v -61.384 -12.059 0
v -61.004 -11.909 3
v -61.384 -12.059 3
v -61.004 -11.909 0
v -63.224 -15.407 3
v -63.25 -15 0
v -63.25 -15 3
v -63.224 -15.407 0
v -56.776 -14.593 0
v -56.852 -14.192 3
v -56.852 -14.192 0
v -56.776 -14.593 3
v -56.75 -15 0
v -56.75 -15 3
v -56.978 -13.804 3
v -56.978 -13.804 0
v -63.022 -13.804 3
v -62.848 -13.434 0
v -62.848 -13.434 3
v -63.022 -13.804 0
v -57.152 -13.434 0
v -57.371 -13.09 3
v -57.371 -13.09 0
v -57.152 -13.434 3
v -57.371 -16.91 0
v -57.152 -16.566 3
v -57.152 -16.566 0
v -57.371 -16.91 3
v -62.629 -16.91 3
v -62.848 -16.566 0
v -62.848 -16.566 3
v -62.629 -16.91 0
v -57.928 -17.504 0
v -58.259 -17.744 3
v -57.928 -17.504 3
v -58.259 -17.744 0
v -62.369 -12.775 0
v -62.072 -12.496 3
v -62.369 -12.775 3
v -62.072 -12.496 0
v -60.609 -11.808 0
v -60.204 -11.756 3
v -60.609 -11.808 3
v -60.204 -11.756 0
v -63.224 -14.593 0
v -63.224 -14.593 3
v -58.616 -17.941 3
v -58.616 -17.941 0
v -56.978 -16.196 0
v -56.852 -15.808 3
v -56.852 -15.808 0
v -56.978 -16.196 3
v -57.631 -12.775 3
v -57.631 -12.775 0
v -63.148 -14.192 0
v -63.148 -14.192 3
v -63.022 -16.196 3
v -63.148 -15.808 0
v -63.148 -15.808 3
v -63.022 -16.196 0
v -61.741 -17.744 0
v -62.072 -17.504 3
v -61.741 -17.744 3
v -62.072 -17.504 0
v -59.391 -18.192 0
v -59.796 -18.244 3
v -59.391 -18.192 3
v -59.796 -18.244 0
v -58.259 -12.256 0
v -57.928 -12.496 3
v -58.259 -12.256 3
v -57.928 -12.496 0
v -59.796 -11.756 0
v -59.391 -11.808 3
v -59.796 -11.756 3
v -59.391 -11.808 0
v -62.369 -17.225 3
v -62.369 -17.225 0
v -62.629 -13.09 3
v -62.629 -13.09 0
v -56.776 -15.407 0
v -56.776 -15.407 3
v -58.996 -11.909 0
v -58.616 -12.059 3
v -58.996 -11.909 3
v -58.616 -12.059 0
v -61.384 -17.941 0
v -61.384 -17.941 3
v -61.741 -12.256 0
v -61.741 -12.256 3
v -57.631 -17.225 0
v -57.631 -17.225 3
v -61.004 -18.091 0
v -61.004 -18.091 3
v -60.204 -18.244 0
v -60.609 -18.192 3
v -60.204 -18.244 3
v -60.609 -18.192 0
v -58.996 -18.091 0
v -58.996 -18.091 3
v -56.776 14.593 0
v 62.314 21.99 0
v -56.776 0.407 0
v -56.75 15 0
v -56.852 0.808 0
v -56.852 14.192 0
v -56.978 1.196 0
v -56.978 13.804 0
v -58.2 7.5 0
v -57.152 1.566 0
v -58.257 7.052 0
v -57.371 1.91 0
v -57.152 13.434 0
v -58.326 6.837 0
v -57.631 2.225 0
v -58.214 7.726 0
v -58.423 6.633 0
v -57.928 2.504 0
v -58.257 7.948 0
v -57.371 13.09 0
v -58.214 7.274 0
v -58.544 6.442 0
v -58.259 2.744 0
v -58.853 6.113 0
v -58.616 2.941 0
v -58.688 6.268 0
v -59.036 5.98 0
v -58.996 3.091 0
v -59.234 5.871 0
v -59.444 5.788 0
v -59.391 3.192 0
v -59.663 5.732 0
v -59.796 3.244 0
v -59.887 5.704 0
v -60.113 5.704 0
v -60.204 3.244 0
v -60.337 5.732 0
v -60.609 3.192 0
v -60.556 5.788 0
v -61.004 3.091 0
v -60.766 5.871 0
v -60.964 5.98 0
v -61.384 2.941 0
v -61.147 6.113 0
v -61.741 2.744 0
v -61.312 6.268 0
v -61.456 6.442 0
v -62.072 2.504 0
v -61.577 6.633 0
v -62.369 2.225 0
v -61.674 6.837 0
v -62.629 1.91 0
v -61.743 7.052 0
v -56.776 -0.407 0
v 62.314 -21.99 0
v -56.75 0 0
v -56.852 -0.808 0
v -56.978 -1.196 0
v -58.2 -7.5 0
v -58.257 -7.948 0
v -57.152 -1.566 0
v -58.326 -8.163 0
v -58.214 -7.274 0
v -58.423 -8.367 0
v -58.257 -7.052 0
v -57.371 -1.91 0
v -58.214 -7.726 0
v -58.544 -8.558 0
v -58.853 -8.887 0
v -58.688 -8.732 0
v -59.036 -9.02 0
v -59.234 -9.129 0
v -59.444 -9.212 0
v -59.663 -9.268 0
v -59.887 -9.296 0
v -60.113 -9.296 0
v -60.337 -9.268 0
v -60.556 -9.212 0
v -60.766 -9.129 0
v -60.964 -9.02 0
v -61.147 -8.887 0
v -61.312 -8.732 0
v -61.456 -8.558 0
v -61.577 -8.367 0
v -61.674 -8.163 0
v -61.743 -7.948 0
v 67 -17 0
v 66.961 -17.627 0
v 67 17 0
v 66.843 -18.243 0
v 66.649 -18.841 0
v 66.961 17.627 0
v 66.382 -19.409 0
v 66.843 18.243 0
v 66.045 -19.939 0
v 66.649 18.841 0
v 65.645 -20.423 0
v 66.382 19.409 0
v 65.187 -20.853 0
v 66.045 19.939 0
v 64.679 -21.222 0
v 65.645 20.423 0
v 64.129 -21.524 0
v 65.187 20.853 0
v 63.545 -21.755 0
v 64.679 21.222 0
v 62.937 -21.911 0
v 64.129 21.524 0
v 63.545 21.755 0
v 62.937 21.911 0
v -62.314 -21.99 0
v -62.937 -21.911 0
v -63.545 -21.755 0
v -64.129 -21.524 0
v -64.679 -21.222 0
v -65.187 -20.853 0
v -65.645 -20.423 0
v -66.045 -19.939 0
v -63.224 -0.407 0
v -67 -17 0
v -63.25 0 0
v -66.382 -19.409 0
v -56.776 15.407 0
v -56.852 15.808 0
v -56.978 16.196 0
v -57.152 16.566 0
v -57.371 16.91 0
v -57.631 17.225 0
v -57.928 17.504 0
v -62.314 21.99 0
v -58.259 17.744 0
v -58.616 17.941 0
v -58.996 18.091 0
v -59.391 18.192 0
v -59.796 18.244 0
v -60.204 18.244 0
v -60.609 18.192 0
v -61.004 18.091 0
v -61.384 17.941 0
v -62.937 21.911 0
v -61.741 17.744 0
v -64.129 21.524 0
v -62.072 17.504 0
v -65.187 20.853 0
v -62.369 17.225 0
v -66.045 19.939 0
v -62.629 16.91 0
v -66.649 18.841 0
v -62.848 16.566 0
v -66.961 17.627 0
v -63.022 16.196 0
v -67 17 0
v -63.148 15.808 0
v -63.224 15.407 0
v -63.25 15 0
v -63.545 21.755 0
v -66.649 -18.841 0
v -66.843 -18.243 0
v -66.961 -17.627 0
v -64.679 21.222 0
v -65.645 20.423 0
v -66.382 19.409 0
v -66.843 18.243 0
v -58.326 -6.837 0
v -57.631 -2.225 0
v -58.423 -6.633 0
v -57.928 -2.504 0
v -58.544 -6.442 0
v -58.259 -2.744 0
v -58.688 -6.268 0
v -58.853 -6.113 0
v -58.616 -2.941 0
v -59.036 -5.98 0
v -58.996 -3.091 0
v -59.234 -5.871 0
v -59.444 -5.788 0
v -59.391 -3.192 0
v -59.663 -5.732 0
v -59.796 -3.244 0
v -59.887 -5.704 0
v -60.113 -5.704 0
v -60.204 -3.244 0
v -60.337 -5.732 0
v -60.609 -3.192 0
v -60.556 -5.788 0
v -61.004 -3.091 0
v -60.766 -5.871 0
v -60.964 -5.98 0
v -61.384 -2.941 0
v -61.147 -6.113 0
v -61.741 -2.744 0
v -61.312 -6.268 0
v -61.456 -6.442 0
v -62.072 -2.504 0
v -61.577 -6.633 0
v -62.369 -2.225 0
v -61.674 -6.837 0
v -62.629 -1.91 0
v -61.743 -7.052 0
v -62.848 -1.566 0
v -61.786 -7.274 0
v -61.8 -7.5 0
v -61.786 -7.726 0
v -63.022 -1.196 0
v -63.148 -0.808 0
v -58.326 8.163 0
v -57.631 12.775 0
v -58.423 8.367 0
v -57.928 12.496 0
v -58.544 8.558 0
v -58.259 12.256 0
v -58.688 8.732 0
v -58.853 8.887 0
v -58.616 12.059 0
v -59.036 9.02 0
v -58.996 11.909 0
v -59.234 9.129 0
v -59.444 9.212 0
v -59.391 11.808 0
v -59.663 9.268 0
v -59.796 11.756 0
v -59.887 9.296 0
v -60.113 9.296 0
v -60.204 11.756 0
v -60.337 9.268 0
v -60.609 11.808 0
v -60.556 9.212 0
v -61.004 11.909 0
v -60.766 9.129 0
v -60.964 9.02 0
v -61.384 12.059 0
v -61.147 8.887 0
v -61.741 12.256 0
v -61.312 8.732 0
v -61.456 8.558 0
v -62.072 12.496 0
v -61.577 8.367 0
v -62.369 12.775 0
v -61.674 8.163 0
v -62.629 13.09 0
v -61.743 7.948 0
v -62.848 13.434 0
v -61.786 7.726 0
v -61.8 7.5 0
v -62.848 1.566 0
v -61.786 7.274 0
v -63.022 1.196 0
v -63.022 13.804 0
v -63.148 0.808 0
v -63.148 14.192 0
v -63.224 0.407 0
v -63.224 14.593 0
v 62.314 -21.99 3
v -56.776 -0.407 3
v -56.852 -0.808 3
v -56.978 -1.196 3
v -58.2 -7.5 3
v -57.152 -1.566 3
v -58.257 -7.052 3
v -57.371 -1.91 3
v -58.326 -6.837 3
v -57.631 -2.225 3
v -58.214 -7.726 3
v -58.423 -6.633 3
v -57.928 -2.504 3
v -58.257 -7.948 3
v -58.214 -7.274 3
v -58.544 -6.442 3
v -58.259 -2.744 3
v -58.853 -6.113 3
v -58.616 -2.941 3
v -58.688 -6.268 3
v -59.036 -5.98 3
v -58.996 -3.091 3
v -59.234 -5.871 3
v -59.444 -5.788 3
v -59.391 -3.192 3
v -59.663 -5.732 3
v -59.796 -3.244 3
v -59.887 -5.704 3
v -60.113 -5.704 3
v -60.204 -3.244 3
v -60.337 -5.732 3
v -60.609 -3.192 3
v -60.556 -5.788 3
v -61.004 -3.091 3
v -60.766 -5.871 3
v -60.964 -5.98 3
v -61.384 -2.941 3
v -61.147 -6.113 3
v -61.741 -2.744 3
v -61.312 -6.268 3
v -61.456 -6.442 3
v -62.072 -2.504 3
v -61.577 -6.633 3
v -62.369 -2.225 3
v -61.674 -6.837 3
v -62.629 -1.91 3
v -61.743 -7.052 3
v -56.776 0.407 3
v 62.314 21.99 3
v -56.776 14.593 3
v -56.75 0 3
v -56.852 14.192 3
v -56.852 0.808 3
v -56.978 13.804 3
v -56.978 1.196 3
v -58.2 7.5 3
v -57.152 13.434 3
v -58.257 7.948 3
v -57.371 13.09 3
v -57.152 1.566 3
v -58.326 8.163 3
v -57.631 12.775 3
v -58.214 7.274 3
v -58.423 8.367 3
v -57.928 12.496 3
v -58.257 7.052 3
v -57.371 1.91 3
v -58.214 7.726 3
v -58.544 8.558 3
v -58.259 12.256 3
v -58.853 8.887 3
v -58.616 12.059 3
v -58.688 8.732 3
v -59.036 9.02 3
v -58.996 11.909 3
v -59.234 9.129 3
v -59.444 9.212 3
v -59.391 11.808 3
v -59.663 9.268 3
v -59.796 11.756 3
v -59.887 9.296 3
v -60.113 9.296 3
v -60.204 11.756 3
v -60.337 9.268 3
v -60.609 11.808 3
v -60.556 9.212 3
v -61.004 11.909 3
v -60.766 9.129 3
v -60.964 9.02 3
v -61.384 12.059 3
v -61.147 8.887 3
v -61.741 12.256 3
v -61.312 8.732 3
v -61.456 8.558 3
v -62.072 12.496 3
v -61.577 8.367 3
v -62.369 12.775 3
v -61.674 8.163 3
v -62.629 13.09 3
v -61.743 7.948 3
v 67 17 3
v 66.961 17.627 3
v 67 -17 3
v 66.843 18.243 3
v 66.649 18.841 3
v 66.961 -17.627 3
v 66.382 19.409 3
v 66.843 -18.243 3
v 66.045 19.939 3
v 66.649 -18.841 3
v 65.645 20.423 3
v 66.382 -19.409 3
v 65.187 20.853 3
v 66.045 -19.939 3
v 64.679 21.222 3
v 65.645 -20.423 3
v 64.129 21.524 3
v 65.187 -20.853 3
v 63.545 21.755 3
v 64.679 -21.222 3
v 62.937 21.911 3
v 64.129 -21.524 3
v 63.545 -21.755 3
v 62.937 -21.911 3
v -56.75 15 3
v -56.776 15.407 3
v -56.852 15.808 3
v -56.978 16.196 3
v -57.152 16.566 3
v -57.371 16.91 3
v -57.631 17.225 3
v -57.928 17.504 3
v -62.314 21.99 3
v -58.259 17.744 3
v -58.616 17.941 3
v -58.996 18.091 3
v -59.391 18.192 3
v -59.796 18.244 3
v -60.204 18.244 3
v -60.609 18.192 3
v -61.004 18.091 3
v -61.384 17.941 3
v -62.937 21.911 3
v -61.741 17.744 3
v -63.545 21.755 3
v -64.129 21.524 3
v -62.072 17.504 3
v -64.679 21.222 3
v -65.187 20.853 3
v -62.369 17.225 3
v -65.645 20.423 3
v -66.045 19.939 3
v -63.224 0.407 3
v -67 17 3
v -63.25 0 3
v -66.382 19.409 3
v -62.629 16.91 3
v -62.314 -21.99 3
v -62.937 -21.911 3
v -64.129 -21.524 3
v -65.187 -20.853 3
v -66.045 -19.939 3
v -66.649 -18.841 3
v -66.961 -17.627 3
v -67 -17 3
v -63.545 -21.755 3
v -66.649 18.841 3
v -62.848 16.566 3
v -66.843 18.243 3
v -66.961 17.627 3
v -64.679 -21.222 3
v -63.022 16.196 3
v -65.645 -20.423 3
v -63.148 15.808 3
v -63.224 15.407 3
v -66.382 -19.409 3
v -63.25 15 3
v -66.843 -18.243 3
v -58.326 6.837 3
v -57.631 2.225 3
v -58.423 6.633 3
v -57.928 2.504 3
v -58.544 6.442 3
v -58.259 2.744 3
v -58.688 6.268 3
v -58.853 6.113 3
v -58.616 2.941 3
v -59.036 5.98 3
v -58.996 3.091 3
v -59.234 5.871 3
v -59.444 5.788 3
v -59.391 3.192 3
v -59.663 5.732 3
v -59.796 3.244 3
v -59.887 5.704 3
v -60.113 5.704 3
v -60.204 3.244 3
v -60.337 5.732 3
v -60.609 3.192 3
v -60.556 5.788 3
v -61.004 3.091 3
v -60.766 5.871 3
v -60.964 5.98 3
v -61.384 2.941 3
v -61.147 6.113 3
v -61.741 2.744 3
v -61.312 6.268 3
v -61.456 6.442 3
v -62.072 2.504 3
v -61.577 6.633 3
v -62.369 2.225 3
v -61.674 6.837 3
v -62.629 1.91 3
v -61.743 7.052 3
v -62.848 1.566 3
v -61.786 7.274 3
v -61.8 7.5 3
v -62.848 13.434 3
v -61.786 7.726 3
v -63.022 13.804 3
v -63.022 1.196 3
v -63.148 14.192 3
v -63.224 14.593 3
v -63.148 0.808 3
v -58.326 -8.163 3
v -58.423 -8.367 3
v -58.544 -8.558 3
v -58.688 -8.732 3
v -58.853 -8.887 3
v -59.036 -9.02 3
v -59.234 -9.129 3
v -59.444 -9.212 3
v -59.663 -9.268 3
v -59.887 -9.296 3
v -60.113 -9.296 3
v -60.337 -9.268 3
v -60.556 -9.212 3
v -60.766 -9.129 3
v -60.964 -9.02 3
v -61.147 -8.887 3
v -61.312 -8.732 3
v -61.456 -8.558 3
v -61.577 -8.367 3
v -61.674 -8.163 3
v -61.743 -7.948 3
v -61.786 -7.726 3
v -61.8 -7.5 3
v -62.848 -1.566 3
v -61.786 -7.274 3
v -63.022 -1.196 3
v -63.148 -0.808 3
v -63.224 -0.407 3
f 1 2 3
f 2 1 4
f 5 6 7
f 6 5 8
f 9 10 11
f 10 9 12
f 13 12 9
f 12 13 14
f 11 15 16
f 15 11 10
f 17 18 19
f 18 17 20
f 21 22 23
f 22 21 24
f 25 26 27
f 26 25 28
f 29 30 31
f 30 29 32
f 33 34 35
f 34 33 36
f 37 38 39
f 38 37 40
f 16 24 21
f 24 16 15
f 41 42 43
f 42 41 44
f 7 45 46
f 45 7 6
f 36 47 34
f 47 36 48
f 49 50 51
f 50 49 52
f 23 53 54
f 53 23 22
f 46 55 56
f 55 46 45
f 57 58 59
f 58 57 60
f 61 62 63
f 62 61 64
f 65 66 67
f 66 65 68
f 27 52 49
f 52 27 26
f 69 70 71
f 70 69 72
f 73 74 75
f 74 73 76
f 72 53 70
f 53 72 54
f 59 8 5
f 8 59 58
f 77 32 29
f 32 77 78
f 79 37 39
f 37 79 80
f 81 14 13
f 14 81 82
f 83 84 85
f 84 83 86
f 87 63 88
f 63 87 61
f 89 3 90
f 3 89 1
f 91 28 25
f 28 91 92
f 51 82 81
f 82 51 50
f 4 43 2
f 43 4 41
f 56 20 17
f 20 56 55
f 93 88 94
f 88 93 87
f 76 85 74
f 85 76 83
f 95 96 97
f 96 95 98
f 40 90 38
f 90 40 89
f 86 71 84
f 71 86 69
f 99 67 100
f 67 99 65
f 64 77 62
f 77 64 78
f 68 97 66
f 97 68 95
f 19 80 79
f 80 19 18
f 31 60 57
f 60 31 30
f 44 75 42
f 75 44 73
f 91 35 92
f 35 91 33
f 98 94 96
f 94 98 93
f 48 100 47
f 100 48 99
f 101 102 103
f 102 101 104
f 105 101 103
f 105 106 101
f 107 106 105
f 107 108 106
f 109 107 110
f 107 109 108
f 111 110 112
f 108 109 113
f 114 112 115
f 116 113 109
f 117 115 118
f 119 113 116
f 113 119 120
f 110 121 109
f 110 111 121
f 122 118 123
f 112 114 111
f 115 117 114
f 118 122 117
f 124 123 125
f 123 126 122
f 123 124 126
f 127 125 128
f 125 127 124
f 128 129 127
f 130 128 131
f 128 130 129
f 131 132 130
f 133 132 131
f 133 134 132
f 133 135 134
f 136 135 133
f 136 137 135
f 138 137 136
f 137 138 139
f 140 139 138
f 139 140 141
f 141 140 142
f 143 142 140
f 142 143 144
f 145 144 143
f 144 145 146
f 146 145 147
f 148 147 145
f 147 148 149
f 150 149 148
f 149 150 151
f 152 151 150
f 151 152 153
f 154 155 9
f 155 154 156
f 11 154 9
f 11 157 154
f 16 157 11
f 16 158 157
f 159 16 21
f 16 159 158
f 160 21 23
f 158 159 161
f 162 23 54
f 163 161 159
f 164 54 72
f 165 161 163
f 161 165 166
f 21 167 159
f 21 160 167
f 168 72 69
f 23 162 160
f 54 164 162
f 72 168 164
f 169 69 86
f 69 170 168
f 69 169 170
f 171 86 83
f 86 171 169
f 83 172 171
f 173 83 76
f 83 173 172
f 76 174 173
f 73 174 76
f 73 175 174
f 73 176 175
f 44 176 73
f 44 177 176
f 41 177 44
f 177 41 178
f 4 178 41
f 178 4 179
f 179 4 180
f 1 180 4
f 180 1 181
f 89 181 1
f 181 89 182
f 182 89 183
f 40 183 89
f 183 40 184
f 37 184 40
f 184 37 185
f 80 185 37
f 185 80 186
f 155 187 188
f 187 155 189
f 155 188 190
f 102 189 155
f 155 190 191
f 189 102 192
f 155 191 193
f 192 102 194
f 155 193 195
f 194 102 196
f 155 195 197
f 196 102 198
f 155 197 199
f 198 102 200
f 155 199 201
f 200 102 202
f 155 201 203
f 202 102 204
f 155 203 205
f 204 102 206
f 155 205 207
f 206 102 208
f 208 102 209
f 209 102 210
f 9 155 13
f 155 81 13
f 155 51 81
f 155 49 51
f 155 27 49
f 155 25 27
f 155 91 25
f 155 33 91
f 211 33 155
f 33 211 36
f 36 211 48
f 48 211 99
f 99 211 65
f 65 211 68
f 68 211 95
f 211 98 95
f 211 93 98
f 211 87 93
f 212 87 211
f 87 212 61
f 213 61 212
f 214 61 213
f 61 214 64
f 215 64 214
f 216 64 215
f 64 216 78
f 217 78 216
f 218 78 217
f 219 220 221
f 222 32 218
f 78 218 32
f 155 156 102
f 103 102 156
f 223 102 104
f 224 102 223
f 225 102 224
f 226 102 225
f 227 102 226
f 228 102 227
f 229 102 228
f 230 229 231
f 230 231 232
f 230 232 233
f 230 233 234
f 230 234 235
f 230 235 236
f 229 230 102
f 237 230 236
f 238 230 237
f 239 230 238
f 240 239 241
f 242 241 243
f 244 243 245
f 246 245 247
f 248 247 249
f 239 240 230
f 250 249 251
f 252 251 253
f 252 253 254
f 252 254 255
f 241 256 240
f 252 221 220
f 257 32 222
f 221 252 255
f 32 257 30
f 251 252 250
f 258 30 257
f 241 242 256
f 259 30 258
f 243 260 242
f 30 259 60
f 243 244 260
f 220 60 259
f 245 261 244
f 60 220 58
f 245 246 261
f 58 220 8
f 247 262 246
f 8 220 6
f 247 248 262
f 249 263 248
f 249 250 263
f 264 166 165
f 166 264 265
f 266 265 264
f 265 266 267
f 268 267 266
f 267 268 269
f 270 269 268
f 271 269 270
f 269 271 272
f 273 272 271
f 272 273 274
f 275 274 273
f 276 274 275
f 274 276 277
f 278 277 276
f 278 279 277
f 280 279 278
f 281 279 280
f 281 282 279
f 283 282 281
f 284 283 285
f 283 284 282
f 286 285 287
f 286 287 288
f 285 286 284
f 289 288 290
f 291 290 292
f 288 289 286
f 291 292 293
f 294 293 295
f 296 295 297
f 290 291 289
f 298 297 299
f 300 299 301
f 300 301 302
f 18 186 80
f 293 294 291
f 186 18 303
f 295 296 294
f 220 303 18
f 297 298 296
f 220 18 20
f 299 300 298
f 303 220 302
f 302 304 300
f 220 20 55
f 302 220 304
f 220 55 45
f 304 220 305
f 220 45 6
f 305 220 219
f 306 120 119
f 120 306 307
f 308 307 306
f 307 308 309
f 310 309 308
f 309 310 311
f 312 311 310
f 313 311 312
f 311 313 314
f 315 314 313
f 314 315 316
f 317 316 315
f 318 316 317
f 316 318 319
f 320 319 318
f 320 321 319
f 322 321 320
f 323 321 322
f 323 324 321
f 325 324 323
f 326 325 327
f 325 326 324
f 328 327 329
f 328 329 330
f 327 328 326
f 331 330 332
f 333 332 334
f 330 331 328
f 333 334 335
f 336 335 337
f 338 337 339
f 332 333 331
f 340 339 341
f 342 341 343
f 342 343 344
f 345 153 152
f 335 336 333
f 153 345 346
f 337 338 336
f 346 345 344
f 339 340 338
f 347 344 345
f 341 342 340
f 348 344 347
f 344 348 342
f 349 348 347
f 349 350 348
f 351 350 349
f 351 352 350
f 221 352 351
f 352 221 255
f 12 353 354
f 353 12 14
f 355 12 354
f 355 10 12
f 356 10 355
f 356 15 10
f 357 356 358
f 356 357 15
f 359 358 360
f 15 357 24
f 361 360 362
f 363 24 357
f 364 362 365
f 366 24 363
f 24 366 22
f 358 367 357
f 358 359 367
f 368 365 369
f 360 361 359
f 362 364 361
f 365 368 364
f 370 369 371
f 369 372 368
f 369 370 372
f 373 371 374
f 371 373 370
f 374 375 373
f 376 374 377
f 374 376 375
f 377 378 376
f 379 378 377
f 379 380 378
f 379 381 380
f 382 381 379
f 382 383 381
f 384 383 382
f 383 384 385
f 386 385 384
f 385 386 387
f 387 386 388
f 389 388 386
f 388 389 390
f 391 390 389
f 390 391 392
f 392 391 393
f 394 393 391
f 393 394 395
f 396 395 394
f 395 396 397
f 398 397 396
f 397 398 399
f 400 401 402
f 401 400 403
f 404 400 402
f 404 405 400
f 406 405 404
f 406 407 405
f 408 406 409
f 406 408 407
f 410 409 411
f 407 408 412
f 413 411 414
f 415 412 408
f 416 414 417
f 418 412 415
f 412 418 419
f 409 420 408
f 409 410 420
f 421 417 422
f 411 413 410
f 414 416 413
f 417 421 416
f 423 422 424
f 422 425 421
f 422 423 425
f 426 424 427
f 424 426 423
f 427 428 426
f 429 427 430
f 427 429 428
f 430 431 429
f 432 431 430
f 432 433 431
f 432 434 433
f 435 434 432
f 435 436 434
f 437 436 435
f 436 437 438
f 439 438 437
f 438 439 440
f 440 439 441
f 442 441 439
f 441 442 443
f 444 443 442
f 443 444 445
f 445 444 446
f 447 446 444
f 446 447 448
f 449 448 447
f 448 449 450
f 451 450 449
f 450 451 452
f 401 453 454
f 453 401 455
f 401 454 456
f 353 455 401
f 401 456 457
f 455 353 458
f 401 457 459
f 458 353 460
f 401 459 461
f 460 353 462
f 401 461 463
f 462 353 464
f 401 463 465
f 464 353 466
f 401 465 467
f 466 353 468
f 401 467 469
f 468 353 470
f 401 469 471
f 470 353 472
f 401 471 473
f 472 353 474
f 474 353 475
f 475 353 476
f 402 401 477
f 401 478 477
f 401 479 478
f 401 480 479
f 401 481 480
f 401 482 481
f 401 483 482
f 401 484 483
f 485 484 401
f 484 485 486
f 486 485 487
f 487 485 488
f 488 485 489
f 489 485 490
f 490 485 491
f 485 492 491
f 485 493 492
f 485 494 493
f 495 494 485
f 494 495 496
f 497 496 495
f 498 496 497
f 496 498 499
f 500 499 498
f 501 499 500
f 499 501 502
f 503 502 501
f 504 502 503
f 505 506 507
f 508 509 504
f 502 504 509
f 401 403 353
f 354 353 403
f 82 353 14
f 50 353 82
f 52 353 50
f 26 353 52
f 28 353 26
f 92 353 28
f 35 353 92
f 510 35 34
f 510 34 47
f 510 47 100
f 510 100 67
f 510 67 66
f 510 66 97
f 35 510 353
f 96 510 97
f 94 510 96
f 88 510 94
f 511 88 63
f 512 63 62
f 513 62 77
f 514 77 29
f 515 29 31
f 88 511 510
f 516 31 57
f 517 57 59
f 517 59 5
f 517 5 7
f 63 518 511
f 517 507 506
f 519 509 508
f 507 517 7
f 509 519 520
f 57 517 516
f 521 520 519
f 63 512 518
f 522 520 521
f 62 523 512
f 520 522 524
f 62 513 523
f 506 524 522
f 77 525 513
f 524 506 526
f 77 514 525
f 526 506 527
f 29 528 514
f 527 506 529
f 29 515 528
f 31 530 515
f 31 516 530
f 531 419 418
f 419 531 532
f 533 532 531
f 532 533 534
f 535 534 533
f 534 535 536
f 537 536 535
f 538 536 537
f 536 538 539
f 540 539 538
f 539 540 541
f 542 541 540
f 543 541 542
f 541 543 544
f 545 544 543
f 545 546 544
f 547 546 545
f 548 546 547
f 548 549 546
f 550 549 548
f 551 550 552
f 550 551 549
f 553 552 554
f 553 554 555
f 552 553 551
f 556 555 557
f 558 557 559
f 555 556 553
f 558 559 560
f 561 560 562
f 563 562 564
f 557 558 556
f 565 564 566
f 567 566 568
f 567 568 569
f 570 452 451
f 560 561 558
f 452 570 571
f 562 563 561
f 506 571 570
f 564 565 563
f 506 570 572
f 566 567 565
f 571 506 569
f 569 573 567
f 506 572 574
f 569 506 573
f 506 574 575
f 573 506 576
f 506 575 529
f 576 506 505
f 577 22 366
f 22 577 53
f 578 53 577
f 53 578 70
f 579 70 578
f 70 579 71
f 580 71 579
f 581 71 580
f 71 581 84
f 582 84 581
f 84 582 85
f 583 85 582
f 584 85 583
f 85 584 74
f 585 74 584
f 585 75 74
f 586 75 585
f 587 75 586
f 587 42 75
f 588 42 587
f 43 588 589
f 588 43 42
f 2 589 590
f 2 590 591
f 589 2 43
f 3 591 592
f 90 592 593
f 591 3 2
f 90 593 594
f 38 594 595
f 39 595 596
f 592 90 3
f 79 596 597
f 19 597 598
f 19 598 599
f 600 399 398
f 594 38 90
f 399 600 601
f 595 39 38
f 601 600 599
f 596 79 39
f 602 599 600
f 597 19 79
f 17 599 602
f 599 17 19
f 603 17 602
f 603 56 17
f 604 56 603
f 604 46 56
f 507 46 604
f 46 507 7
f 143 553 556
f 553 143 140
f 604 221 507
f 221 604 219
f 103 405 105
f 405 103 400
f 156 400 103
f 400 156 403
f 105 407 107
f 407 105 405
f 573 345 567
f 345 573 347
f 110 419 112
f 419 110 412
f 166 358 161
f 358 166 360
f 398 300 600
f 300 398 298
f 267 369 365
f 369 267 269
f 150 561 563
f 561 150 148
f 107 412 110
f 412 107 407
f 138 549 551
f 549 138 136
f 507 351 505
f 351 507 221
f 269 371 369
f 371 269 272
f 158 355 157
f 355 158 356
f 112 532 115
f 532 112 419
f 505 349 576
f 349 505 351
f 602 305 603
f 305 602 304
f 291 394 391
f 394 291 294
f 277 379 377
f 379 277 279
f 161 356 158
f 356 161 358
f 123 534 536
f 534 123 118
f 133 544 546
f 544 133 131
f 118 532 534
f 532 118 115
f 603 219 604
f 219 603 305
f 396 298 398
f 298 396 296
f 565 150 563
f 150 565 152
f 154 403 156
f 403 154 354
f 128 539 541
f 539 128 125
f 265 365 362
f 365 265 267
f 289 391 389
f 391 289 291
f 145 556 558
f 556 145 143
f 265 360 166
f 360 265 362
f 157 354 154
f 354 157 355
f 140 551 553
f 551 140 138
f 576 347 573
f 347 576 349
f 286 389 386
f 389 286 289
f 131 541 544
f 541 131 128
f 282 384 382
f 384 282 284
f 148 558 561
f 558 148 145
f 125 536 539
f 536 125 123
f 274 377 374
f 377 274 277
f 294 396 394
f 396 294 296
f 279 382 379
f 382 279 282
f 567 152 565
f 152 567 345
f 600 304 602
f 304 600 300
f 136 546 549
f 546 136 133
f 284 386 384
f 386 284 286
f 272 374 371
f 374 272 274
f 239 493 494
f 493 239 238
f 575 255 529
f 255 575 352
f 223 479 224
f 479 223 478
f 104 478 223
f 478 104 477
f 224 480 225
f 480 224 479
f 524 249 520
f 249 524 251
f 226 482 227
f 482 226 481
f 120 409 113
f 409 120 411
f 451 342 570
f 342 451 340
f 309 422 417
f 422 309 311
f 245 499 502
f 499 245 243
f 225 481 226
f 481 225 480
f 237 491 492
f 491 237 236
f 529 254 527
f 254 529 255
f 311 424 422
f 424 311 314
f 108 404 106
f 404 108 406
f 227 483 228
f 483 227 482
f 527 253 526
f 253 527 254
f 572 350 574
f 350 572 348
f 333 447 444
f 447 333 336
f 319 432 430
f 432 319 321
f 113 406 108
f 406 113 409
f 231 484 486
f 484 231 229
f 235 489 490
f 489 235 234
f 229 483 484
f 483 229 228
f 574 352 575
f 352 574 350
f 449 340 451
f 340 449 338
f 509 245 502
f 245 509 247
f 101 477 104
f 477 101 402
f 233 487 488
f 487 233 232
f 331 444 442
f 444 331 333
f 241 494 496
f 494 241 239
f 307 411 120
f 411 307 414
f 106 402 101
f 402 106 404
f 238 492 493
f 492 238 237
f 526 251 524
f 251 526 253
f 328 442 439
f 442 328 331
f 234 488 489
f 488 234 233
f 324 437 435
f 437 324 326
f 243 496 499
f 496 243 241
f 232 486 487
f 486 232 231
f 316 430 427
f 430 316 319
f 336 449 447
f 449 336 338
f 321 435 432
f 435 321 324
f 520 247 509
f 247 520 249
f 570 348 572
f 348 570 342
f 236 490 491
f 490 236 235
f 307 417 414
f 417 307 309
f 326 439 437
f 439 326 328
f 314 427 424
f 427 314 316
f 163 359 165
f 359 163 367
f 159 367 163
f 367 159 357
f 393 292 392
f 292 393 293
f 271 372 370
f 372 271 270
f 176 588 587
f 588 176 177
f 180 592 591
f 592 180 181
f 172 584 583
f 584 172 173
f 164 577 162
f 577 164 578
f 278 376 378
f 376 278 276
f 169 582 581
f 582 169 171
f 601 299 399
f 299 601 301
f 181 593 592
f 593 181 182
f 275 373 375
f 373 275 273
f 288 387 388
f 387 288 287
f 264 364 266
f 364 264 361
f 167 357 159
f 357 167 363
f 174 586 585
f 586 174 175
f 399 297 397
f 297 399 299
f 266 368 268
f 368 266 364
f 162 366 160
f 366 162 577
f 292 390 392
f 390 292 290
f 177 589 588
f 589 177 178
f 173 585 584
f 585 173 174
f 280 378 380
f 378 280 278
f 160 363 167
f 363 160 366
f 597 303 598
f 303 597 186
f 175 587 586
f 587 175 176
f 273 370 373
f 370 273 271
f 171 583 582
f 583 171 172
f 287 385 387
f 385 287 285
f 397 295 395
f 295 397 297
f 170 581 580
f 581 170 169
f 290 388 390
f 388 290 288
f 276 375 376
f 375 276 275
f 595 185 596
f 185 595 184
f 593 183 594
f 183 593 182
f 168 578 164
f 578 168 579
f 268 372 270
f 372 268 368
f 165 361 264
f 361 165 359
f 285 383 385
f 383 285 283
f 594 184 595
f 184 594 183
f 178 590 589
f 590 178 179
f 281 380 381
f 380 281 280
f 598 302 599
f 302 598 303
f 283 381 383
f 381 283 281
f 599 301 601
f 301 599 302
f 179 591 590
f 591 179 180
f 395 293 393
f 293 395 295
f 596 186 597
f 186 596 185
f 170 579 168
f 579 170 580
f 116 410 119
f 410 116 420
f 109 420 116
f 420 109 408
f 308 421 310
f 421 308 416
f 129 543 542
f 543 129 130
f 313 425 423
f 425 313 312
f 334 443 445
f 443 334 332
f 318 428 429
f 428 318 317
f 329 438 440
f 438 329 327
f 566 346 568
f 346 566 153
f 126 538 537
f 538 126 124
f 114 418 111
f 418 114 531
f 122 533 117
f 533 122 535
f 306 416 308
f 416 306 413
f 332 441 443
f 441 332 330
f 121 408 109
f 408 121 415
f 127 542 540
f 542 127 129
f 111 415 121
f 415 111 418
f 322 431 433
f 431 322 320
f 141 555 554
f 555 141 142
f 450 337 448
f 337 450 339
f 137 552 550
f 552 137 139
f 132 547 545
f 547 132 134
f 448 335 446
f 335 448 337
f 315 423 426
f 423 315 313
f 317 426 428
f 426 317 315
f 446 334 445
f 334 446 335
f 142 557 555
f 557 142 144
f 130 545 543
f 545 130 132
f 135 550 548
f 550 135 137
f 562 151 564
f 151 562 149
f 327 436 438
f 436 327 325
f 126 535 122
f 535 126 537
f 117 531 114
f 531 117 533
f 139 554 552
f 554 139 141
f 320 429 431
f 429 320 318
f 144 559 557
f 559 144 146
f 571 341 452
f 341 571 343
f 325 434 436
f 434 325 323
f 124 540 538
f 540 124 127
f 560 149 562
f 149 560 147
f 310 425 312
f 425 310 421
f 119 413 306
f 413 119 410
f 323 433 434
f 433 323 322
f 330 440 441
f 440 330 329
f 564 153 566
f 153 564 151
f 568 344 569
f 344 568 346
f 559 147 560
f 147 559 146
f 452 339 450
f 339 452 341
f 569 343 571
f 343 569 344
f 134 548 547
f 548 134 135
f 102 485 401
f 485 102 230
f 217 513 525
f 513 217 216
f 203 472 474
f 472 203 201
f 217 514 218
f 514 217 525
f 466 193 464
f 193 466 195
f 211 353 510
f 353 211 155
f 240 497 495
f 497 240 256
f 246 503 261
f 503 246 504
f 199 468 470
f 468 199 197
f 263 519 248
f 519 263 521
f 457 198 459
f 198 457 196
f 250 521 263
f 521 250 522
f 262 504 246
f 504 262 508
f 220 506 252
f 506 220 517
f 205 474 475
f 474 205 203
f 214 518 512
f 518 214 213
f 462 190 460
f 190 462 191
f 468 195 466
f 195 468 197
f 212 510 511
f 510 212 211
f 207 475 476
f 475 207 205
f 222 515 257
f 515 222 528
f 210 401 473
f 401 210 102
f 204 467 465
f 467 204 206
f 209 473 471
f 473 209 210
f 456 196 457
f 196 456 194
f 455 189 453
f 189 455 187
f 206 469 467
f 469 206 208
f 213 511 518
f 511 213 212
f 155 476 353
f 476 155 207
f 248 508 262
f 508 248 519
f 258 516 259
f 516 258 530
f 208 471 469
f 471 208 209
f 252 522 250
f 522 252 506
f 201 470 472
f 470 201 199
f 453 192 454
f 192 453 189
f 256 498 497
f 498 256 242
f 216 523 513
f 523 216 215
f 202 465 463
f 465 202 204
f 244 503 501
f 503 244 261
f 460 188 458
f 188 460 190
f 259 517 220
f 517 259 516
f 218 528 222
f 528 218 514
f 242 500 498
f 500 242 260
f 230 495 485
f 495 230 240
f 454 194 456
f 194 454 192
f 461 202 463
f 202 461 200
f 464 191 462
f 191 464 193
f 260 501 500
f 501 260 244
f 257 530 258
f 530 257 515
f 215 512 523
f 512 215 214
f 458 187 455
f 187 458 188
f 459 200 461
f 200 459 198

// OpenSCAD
$fn = 50;


difference() {
	union() {
		hull() {
			translate(v = [-62.0000000000, 17.0000000000, 0]) {
				cylinder(h = 3, r = 5);
			}
			translate(v = [62.0000000000, 17.0000000000, 0]) {
				cylinder(h = 3, r = 5);
			}
			translate(v = [-62.0000000000, -17.0000000000, 0]) {
				cylinder(h = 3, r = 5);
			}
			translate(v = [62.0000000000, -17.0000000000, 0]) {
				cylinder(h = 3, r = 5);
			}
		}
	}
	union() {
		translate(v = [-60.0000000000, -15.0000000000, 0]) {
			cylinder(h = 3, r = 3.2500000000);
		}
		translate(v = [-60.0000000000, 0.0000000000, 0]) {
			cylinder(h = 3, r = 3.2500000000);
		}
		translate(v = [-60.0000000000, 15.0000000000, 0]) {
			cylinder(h = 3, r = 3.2500000000);
		}
		translate(v = [-60.0000000000, -15.0000000000, 0]) {
			cylinder(h = 3, r = 1.8000000000);
		}
		translate(v = [-60.0000000000, -7.5000000000, 0]) {
			cylinder(h = 3, r = 1.8000000000);
		}
		translate(v = [-60.0000000000, 0.0000000000, 0]) {
			cylinder(h = 3, r = 1.8000000000);
		}
		translate(v = [-60.0000000000, 7.5000000000, 0]) {
			cylinder(h = 3, r = 1.8000000000);
		}
		translate(v = [-60.0000000000, 15.0000000000, 0]) {
			cylinder(h = 3, r = 1.8000000000);
		}
		translate(v = [-60.0000000000, -15.0000000000, 0]) {
			cylinder(h = 3, r = 1.8000000000);
		}
		translate(v = [-60.0000000000, -7.5000000000, 0]) {
			cylinder(h = 3, r = 1.8000000000);
		}
		translate(v = [-60.0000000000, 0.0000000000, 0]) {
			cylinder(h = 3, r = 1.8000000000);
		}
		translate(v = [-60.0000000000, 7.5000000000, 0]) {
			cylinder(h = 3, r = 1.8000000000);
		}
		translate(v = [-60.0000000000, 15.0000000000, 0]) {
			cylinder(h = 3, r = 1.8000000000);
		}
		translate(v = [-60.0000000000, -15.0000000000, 0]) {
			cylinder(h = 3, r = 1.8000000000);
		}
		translate(v = [-60.0000000000, -7.5000000000, 0]) {
			cylinder(h = 3, r = 1.8000000000);
		}
		translate(v = [-60.0000000000, 0.0000000000, 0]) {
			cylinder(h = 3, r = 1.8000000000);
		}
		translate(v = [-60.0000000000, 7.5000000000, 0]) {
			cylinder(h = 3, r = 1.8000000000);
		}
		translate(v = [-60.0000000000, 15.0000000000, 0]) {
			cylinder(h = 3, r = 1.8000000000);
		}
	}
}
